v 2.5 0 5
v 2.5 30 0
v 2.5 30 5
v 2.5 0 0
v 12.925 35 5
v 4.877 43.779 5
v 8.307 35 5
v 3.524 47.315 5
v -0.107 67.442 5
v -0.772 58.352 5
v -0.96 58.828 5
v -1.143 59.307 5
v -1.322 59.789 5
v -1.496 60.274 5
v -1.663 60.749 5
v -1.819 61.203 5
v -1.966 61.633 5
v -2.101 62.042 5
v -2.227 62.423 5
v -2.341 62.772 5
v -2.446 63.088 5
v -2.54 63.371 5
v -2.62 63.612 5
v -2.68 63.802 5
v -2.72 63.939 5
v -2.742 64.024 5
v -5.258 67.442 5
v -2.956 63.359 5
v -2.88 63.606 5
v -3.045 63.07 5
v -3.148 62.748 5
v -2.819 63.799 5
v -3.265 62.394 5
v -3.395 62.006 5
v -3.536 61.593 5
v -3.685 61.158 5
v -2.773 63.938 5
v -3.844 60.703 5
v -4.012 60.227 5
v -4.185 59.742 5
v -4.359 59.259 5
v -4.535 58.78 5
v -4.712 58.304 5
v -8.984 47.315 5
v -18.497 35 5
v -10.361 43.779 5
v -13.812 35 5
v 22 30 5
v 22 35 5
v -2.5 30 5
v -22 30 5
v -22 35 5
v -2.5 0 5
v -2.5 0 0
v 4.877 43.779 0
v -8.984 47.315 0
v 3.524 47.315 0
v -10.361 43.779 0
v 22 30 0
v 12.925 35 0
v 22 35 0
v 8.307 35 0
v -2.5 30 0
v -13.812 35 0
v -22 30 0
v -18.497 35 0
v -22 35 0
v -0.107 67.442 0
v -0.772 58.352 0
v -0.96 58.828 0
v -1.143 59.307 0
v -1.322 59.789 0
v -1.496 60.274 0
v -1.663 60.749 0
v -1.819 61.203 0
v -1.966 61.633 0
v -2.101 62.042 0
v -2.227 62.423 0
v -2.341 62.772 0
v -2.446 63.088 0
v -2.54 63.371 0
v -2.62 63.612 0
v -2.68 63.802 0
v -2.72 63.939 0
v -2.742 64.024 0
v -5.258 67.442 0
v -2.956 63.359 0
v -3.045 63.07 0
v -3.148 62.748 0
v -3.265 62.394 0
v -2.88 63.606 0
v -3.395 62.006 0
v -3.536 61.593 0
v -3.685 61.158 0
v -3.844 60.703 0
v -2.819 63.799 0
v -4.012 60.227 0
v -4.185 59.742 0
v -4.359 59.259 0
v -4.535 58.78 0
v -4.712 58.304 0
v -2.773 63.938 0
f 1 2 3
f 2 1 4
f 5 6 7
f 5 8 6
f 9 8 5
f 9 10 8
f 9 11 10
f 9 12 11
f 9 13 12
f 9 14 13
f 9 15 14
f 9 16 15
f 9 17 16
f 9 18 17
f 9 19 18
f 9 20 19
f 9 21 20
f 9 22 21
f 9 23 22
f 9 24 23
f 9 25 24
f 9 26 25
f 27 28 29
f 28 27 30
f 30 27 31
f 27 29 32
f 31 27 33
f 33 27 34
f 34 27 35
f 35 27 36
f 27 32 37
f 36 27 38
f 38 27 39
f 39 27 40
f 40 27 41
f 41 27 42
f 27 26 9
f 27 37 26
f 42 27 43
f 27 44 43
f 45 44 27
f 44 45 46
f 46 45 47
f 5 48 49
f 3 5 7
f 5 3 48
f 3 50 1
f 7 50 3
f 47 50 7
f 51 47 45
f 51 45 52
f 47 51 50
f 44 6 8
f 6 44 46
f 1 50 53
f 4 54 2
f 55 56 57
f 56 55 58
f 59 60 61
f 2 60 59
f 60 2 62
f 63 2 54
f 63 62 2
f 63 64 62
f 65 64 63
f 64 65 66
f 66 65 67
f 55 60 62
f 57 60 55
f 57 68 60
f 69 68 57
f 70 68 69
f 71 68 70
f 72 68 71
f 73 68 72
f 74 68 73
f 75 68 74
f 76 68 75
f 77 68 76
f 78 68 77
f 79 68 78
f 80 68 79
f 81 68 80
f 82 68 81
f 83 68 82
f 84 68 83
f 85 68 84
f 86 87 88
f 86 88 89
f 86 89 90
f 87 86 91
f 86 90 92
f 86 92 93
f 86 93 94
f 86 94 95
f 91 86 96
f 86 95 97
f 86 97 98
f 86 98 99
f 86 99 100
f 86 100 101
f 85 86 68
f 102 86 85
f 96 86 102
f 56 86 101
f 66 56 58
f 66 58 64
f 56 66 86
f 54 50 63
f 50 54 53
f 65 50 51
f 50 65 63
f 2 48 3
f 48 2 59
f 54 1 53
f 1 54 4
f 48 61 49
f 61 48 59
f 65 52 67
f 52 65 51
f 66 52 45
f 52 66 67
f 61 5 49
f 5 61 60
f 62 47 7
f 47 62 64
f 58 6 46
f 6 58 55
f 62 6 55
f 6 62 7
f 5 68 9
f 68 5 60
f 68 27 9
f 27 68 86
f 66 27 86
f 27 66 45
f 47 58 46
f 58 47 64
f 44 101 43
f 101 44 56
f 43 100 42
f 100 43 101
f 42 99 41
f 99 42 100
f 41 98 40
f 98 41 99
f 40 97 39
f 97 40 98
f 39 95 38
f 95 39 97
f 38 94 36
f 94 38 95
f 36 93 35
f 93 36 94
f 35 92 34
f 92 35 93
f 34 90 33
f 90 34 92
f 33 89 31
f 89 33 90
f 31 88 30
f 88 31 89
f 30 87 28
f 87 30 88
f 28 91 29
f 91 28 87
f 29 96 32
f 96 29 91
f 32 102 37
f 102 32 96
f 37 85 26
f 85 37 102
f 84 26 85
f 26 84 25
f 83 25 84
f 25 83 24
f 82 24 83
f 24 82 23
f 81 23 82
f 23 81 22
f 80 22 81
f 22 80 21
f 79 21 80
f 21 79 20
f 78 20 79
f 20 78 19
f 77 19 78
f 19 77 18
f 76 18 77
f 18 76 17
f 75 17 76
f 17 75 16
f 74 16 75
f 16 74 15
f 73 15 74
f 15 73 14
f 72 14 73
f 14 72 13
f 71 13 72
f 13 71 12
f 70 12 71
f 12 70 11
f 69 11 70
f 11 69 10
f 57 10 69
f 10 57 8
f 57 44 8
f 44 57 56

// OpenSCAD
// Olimpics 2016
// By Magonegro JUL-2016
// Customizer for the Olympics Rio2016 rotating logo

// Stake height
HEIGHT=30;
// Custom text in the platter:
TEXT="A";
// Text size:
TEXTSIZE=35;
// To adjust X text pos :
XTEXTOFFSET=3;
// To adjust Y text pos (assure text is attached to baseline):
YTEXTOFFSET=-1;

/// [hidden]
STAKE=5; // 5mm square stake fixed

union()
{
    translate([-STAKE/2,0,0]) cube([STAKE,HEIGHT,STAKE]);
    translate([-22,HEIGHT,0]) cube([44,STAKE,STAKE]);
    translate([XTEXTOFFSET-22,HEIGHT+STAKE+YTEXTOFFSET,0]) 
        linear_extrude(height = STAKE, convexity = 10)
        text(TEXT, font = "Arial:style=Black",size=TEXTSIZE);
}
